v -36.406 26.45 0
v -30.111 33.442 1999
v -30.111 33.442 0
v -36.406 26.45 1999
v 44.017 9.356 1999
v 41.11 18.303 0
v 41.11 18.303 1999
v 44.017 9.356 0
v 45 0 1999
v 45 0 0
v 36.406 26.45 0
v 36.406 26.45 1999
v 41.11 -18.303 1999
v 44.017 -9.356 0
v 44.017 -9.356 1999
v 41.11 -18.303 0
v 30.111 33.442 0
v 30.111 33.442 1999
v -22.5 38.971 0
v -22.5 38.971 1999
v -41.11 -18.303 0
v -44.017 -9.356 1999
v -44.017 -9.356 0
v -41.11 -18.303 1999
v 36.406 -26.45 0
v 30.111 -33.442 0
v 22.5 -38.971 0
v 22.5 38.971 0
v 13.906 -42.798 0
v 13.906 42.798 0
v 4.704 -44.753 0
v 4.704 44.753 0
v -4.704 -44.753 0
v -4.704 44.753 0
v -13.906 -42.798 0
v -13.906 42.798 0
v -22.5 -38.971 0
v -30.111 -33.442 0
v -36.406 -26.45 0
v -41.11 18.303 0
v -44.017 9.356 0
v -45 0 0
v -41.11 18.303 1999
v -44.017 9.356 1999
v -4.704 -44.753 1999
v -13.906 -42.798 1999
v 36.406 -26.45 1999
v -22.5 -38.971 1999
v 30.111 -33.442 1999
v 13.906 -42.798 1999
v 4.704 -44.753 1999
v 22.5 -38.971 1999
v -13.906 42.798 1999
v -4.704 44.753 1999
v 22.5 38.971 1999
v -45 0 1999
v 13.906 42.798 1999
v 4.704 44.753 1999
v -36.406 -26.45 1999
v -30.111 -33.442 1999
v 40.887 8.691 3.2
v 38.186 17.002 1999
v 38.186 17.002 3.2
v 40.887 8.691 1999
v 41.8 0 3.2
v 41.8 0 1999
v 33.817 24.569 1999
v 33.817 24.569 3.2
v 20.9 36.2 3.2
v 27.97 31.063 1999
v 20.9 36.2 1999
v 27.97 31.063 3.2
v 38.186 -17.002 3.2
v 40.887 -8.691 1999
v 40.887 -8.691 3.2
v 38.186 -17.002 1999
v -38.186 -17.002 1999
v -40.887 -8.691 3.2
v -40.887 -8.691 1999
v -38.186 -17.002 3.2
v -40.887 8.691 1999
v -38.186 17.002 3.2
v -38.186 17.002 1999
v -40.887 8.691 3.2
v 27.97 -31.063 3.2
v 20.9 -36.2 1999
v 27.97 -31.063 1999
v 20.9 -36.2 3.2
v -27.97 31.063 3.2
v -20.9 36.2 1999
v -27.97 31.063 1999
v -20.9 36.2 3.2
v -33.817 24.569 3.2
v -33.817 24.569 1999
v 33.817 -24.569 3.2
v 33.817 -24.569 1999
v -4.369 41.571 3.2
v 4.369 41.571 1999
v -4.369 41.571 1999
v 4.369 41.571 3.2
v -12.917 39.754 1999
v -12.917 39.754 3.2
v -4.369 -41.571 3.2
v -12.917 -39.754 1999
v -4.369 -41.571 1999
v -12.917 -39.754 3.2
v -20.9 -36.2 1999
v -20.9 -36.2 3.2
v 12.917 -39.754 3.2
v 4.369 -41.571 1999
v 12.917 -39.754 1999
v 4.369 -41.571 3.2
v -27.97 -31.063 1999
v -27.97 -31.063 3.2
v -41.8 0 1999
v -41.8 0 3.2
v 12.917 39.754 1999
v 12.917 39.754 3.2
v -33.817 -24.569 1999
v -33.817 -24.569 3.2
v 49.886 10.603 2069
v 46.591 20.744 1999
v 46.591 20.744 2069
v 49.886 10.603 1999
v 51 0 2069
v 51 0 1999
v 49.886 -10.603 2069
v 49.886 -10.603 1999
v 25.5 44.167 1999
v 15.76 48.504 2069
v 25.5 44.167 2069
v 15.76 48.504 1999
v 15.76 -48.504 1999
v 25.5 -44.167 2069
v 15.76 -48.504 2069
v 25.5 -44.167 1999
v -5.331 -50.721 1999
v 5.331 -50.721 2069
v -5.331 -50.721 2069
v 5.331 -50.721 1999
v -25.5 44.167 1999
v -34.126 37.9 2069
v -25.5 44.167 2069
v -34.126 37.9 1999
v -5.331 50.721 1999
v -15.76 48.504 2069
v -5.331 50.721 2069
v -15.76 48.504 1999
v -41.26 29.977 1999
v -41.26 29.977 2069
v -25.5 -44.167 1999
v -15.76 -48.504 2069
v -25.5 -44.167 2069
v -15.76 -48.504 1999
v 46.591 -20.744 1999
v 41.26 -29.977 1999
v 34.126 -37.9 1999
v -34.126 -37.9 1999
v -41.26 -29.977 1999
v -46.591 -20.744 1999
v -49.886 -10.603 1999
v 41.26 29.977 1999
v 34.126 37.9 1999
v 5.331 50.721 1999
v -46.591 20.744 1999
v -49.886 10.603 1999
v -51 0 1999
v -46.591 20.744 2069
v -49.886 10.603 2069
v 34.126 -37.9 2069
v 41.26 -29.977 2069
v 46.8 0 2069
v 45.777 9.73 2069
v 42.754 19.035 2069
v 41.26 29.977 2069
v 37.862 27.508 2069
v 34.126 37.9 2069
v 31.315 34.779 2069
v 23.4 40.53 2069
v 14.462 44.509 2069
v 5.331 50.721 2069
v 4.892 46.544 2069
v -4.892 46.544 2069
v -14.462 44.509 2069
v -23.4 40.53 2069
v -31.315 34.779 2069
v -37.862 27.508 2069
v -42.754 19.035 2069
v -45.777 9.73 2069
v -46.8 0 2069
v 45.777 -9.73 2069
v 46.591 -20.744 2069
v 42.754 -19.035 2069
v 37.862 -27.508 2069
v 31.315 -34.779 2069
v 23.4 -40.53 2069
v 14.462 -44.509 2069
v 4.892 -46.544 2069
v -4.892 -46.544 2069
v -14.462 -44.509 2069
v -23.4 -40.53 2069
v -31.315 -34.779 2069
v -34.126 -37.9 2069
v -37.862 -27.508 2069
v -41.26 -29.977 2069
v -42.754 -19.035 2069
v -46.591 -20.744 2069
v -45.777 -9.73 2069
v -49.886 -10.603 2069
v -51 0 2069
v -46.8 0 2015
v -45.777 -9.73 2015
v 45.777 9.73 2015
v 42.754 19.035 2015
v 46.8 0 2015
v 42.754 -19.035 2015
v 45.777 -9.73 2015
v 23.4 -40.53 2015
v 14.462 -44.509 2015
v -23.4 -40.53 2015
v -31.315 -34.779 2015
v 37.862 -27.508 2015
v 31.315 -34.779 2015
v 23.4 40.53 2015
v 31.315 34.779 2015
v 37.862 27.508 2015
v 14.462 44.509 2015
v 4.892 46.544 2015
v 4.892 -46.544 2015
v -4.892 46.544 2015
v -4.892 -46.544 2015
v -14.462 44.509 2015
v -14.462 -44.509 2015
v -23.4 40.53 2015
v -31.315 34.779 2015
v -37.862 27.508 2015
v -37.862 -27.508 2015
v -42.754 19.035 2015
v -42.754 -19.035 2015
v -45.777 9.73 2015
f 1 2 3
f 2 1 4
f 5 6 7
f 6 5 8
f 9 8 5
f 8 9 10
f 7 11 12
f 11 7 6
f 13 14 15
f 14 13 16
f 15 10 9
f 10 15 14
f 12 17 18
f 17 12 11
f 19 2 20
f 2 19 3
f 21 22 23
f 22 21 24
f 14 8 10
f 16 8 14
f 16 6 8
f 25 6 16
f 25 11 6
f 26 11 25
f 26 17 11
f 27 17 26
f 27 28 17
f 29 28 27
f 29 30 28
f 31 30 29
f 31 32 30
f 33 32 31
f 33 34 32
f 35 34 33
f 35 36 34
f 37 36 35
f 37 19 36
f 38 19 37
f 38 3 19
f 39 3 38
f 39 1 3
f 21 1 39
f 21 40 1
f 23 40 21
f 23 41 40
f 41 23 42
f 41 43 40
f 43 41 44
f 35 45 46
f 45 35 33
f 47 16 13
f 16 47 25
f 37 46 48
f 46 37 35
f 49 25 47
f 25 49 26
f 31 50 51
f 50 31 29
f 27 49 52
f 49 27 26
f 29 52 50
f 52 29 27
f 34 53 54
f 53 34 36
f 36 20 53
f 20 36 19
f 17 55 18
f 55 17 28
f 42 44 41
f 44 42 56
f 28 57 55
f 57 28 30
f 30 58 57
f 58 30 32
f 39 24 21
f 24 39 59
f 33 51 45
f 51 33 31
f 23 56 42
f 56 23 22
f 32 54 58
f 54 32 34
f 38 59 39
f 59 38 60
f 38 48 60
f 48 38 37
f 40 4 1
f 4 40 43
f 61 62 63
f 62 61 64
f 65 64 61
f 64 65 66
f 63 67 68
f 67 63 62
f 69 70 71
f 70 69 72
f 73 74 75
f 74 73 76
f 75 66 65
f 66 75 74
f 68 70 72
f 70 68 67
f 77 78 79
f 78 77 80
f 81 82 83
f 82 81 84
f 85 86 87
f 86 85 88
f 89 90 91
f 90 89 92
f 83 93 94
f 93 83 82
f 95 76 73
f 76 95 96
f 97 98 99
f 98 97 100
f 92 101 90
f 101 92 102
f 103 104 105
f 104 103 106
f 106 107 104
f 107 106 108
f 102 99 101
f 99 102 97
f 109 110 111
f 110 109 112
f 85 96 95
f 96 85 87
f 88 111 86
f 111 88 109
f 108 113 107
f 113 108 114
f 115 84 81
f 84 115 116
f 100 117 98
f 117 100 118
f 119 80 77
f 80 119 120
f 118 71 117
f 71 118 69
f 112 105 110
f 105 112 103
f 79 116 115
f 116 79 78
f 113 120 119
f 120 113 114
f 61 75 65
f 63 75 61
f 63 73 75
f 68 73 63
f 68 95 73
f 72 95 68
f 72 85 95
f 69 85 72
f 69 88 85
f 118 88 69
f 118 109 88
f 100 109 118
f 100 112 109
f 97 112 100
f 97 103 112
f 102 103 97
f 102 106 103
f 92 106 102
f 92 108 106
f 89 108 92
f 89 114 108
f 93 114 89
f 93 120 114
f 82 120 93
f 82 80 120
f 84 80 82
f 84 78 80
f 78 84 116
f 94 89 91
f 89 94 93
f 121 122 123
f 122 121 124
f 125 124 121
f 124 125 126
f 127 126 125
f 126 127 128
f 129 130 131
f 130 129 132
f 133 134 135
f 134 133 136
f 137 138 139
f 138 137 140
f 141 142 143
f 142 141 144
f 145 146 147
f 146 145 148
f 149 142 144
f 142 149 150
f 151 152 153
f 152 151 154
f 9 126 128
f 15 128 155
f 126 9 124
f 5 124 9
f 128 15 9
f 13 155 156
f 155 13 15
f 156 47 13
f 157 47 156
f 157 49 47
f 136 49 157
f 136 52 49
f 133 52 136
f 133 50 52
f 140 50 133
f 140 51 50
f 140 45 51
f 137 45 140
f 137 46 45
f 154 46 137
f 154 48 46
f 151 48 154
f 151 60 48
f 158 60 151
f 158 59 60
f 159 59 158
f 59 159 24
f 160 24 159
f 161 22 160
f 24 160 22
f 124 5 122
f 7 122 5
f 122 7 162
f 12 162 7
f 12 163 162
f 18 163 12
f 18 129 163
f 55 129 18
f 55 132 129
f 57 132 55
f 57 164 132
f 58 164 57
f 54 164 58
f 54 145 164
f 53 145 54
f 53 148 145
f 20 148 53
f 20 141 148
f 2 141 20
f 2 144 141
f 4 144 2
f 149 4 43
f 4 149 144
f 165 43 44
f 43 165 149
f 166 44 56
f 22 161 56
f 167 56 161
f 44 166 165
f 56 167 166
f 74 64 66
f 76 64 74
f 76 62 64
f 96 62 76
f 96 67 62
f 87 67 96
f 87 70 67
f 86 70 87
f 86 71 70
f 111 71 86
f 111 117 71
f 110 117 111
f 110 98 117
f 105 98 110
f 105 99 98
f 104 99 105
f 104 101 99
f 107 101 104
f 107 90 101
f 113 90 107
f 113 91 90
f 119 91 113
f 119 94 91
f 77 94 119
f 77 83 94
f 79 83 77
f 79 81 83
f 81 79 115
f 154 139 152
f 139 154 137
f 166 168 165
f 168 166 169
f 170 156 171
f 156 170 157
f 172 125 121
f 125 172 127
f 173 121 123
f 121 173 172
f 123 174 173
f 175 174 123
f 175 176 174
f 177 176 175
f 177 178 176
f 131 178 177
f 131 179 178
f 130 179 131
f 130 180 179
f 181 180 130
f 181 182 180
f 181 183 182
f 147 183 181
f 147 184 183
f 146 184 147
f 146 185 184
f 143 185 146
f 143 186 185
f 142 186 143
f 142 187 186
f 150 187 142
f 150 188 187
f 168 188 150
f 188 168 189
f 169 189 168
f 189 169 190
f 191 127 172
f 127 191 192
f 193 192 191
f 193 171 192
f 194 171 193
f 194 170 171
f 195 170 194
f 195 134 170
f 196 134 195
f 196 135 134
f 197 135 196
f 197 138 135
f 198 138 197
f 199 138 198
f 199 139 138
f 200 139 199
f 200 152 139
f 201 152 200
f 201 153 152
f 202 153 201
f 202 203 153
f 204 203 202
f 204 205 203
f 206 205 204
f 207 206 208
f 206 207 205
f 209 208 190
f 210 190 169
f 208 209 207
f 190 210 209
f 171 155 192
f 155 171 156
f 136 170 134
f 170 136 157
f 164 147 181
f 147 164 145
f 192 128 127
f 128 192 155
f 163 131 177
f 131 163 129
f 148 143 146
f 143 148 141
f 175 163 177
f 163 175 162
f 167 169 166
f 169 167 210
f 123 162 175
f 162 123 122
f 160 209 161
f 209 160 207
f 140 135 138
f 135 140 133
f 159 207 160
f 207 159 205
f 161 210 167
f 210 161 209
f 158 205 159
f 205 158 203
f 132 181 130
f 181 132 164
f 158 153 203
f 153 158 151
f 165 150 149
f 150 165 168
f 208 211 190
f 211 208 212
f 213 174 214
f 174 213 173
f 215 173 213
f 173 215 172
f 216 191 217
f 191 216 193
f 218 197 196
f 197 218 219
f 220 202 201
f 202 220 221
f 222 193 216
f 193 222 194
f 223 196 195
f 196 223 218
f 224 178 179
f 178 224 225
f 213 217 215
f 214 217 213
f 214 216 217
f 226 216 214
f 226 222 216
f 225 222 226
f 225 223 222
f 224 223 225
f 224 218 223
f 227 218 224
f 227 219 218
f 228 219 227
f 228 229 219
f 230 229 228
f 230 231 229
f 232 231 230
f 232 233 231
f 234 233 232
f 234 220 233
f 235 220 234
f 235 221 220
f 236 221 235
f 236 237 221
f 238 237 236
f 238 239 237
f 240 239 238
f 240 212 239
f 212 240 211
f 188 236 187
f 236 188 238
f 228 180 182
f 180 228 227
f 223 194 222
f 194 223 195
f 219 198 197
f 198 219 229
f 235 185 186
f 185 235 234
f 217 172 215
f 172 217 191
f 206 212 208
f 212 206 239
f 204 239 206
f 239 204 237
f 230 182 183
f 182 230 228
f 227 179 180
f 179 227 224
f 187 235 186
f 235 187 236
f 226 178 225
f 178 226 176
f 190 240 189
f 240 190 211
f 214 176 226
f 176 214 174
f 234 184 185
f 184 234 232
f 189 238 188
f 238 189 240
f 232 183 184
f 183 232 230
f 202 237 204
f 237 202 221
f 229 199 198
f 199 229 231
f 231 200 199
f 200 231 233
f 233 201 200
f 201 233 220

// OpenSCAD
// Parameters
pipe_standard = 1; //[1:1:1]
nominal_diameter_mm = 90; //[45:180:1]
length_mm = 2000; //[1000:4000:10]
center = 0; //[0:1:1]
wall_thickness_mm = 3.2; //[1.6:6.4:0.1]
fitting_length_mm = 70; //[35:140:1]
fitting_outer_diameter_extra_mm = 12; //[6:24:1]
socket_wall_extra_mm = 1.8; //[0.8:3.6:0.1]
socket_depth_mm = 55; //[25:110:1]
connection_overlap_mm = 1; //[0.5:2:0.1]

// Module for the HT Pipe
module ht_pipe() {
  color([0.85, 0.85, 0.8]) { // Off-white for PVC
    // Hollow tube body
    difference() {
      cylinder(h=length_mm, r=nominal_diameter_mm/2, center=false);
      translate([0, 0, wall_thickness_mm])
        cylinder(h=length_mm, r=nominal_diameter_mm/2 - wall_thickness_mm, center=false);
    }
    
    // End fitting
    difference() {
      translate([0, 0, length_mm - connection_overlap_mm])
        cylinder(h=fitting_length_mm, r=nominal_diameter_mm/2 + fitting_outer_diameter_extra_mm/2, center=false);
      translate([0, 0, length_mm + fitting_length_mm - socket_depth_mm])
        cylinder(h=socket_depth_mm, r=nominal_diameter_mm/2 + socket_wall_extra_mm, center=false);
    }
  }
}

// Assembly
module assembly() {
  ht_pipe();
}

assembly();
